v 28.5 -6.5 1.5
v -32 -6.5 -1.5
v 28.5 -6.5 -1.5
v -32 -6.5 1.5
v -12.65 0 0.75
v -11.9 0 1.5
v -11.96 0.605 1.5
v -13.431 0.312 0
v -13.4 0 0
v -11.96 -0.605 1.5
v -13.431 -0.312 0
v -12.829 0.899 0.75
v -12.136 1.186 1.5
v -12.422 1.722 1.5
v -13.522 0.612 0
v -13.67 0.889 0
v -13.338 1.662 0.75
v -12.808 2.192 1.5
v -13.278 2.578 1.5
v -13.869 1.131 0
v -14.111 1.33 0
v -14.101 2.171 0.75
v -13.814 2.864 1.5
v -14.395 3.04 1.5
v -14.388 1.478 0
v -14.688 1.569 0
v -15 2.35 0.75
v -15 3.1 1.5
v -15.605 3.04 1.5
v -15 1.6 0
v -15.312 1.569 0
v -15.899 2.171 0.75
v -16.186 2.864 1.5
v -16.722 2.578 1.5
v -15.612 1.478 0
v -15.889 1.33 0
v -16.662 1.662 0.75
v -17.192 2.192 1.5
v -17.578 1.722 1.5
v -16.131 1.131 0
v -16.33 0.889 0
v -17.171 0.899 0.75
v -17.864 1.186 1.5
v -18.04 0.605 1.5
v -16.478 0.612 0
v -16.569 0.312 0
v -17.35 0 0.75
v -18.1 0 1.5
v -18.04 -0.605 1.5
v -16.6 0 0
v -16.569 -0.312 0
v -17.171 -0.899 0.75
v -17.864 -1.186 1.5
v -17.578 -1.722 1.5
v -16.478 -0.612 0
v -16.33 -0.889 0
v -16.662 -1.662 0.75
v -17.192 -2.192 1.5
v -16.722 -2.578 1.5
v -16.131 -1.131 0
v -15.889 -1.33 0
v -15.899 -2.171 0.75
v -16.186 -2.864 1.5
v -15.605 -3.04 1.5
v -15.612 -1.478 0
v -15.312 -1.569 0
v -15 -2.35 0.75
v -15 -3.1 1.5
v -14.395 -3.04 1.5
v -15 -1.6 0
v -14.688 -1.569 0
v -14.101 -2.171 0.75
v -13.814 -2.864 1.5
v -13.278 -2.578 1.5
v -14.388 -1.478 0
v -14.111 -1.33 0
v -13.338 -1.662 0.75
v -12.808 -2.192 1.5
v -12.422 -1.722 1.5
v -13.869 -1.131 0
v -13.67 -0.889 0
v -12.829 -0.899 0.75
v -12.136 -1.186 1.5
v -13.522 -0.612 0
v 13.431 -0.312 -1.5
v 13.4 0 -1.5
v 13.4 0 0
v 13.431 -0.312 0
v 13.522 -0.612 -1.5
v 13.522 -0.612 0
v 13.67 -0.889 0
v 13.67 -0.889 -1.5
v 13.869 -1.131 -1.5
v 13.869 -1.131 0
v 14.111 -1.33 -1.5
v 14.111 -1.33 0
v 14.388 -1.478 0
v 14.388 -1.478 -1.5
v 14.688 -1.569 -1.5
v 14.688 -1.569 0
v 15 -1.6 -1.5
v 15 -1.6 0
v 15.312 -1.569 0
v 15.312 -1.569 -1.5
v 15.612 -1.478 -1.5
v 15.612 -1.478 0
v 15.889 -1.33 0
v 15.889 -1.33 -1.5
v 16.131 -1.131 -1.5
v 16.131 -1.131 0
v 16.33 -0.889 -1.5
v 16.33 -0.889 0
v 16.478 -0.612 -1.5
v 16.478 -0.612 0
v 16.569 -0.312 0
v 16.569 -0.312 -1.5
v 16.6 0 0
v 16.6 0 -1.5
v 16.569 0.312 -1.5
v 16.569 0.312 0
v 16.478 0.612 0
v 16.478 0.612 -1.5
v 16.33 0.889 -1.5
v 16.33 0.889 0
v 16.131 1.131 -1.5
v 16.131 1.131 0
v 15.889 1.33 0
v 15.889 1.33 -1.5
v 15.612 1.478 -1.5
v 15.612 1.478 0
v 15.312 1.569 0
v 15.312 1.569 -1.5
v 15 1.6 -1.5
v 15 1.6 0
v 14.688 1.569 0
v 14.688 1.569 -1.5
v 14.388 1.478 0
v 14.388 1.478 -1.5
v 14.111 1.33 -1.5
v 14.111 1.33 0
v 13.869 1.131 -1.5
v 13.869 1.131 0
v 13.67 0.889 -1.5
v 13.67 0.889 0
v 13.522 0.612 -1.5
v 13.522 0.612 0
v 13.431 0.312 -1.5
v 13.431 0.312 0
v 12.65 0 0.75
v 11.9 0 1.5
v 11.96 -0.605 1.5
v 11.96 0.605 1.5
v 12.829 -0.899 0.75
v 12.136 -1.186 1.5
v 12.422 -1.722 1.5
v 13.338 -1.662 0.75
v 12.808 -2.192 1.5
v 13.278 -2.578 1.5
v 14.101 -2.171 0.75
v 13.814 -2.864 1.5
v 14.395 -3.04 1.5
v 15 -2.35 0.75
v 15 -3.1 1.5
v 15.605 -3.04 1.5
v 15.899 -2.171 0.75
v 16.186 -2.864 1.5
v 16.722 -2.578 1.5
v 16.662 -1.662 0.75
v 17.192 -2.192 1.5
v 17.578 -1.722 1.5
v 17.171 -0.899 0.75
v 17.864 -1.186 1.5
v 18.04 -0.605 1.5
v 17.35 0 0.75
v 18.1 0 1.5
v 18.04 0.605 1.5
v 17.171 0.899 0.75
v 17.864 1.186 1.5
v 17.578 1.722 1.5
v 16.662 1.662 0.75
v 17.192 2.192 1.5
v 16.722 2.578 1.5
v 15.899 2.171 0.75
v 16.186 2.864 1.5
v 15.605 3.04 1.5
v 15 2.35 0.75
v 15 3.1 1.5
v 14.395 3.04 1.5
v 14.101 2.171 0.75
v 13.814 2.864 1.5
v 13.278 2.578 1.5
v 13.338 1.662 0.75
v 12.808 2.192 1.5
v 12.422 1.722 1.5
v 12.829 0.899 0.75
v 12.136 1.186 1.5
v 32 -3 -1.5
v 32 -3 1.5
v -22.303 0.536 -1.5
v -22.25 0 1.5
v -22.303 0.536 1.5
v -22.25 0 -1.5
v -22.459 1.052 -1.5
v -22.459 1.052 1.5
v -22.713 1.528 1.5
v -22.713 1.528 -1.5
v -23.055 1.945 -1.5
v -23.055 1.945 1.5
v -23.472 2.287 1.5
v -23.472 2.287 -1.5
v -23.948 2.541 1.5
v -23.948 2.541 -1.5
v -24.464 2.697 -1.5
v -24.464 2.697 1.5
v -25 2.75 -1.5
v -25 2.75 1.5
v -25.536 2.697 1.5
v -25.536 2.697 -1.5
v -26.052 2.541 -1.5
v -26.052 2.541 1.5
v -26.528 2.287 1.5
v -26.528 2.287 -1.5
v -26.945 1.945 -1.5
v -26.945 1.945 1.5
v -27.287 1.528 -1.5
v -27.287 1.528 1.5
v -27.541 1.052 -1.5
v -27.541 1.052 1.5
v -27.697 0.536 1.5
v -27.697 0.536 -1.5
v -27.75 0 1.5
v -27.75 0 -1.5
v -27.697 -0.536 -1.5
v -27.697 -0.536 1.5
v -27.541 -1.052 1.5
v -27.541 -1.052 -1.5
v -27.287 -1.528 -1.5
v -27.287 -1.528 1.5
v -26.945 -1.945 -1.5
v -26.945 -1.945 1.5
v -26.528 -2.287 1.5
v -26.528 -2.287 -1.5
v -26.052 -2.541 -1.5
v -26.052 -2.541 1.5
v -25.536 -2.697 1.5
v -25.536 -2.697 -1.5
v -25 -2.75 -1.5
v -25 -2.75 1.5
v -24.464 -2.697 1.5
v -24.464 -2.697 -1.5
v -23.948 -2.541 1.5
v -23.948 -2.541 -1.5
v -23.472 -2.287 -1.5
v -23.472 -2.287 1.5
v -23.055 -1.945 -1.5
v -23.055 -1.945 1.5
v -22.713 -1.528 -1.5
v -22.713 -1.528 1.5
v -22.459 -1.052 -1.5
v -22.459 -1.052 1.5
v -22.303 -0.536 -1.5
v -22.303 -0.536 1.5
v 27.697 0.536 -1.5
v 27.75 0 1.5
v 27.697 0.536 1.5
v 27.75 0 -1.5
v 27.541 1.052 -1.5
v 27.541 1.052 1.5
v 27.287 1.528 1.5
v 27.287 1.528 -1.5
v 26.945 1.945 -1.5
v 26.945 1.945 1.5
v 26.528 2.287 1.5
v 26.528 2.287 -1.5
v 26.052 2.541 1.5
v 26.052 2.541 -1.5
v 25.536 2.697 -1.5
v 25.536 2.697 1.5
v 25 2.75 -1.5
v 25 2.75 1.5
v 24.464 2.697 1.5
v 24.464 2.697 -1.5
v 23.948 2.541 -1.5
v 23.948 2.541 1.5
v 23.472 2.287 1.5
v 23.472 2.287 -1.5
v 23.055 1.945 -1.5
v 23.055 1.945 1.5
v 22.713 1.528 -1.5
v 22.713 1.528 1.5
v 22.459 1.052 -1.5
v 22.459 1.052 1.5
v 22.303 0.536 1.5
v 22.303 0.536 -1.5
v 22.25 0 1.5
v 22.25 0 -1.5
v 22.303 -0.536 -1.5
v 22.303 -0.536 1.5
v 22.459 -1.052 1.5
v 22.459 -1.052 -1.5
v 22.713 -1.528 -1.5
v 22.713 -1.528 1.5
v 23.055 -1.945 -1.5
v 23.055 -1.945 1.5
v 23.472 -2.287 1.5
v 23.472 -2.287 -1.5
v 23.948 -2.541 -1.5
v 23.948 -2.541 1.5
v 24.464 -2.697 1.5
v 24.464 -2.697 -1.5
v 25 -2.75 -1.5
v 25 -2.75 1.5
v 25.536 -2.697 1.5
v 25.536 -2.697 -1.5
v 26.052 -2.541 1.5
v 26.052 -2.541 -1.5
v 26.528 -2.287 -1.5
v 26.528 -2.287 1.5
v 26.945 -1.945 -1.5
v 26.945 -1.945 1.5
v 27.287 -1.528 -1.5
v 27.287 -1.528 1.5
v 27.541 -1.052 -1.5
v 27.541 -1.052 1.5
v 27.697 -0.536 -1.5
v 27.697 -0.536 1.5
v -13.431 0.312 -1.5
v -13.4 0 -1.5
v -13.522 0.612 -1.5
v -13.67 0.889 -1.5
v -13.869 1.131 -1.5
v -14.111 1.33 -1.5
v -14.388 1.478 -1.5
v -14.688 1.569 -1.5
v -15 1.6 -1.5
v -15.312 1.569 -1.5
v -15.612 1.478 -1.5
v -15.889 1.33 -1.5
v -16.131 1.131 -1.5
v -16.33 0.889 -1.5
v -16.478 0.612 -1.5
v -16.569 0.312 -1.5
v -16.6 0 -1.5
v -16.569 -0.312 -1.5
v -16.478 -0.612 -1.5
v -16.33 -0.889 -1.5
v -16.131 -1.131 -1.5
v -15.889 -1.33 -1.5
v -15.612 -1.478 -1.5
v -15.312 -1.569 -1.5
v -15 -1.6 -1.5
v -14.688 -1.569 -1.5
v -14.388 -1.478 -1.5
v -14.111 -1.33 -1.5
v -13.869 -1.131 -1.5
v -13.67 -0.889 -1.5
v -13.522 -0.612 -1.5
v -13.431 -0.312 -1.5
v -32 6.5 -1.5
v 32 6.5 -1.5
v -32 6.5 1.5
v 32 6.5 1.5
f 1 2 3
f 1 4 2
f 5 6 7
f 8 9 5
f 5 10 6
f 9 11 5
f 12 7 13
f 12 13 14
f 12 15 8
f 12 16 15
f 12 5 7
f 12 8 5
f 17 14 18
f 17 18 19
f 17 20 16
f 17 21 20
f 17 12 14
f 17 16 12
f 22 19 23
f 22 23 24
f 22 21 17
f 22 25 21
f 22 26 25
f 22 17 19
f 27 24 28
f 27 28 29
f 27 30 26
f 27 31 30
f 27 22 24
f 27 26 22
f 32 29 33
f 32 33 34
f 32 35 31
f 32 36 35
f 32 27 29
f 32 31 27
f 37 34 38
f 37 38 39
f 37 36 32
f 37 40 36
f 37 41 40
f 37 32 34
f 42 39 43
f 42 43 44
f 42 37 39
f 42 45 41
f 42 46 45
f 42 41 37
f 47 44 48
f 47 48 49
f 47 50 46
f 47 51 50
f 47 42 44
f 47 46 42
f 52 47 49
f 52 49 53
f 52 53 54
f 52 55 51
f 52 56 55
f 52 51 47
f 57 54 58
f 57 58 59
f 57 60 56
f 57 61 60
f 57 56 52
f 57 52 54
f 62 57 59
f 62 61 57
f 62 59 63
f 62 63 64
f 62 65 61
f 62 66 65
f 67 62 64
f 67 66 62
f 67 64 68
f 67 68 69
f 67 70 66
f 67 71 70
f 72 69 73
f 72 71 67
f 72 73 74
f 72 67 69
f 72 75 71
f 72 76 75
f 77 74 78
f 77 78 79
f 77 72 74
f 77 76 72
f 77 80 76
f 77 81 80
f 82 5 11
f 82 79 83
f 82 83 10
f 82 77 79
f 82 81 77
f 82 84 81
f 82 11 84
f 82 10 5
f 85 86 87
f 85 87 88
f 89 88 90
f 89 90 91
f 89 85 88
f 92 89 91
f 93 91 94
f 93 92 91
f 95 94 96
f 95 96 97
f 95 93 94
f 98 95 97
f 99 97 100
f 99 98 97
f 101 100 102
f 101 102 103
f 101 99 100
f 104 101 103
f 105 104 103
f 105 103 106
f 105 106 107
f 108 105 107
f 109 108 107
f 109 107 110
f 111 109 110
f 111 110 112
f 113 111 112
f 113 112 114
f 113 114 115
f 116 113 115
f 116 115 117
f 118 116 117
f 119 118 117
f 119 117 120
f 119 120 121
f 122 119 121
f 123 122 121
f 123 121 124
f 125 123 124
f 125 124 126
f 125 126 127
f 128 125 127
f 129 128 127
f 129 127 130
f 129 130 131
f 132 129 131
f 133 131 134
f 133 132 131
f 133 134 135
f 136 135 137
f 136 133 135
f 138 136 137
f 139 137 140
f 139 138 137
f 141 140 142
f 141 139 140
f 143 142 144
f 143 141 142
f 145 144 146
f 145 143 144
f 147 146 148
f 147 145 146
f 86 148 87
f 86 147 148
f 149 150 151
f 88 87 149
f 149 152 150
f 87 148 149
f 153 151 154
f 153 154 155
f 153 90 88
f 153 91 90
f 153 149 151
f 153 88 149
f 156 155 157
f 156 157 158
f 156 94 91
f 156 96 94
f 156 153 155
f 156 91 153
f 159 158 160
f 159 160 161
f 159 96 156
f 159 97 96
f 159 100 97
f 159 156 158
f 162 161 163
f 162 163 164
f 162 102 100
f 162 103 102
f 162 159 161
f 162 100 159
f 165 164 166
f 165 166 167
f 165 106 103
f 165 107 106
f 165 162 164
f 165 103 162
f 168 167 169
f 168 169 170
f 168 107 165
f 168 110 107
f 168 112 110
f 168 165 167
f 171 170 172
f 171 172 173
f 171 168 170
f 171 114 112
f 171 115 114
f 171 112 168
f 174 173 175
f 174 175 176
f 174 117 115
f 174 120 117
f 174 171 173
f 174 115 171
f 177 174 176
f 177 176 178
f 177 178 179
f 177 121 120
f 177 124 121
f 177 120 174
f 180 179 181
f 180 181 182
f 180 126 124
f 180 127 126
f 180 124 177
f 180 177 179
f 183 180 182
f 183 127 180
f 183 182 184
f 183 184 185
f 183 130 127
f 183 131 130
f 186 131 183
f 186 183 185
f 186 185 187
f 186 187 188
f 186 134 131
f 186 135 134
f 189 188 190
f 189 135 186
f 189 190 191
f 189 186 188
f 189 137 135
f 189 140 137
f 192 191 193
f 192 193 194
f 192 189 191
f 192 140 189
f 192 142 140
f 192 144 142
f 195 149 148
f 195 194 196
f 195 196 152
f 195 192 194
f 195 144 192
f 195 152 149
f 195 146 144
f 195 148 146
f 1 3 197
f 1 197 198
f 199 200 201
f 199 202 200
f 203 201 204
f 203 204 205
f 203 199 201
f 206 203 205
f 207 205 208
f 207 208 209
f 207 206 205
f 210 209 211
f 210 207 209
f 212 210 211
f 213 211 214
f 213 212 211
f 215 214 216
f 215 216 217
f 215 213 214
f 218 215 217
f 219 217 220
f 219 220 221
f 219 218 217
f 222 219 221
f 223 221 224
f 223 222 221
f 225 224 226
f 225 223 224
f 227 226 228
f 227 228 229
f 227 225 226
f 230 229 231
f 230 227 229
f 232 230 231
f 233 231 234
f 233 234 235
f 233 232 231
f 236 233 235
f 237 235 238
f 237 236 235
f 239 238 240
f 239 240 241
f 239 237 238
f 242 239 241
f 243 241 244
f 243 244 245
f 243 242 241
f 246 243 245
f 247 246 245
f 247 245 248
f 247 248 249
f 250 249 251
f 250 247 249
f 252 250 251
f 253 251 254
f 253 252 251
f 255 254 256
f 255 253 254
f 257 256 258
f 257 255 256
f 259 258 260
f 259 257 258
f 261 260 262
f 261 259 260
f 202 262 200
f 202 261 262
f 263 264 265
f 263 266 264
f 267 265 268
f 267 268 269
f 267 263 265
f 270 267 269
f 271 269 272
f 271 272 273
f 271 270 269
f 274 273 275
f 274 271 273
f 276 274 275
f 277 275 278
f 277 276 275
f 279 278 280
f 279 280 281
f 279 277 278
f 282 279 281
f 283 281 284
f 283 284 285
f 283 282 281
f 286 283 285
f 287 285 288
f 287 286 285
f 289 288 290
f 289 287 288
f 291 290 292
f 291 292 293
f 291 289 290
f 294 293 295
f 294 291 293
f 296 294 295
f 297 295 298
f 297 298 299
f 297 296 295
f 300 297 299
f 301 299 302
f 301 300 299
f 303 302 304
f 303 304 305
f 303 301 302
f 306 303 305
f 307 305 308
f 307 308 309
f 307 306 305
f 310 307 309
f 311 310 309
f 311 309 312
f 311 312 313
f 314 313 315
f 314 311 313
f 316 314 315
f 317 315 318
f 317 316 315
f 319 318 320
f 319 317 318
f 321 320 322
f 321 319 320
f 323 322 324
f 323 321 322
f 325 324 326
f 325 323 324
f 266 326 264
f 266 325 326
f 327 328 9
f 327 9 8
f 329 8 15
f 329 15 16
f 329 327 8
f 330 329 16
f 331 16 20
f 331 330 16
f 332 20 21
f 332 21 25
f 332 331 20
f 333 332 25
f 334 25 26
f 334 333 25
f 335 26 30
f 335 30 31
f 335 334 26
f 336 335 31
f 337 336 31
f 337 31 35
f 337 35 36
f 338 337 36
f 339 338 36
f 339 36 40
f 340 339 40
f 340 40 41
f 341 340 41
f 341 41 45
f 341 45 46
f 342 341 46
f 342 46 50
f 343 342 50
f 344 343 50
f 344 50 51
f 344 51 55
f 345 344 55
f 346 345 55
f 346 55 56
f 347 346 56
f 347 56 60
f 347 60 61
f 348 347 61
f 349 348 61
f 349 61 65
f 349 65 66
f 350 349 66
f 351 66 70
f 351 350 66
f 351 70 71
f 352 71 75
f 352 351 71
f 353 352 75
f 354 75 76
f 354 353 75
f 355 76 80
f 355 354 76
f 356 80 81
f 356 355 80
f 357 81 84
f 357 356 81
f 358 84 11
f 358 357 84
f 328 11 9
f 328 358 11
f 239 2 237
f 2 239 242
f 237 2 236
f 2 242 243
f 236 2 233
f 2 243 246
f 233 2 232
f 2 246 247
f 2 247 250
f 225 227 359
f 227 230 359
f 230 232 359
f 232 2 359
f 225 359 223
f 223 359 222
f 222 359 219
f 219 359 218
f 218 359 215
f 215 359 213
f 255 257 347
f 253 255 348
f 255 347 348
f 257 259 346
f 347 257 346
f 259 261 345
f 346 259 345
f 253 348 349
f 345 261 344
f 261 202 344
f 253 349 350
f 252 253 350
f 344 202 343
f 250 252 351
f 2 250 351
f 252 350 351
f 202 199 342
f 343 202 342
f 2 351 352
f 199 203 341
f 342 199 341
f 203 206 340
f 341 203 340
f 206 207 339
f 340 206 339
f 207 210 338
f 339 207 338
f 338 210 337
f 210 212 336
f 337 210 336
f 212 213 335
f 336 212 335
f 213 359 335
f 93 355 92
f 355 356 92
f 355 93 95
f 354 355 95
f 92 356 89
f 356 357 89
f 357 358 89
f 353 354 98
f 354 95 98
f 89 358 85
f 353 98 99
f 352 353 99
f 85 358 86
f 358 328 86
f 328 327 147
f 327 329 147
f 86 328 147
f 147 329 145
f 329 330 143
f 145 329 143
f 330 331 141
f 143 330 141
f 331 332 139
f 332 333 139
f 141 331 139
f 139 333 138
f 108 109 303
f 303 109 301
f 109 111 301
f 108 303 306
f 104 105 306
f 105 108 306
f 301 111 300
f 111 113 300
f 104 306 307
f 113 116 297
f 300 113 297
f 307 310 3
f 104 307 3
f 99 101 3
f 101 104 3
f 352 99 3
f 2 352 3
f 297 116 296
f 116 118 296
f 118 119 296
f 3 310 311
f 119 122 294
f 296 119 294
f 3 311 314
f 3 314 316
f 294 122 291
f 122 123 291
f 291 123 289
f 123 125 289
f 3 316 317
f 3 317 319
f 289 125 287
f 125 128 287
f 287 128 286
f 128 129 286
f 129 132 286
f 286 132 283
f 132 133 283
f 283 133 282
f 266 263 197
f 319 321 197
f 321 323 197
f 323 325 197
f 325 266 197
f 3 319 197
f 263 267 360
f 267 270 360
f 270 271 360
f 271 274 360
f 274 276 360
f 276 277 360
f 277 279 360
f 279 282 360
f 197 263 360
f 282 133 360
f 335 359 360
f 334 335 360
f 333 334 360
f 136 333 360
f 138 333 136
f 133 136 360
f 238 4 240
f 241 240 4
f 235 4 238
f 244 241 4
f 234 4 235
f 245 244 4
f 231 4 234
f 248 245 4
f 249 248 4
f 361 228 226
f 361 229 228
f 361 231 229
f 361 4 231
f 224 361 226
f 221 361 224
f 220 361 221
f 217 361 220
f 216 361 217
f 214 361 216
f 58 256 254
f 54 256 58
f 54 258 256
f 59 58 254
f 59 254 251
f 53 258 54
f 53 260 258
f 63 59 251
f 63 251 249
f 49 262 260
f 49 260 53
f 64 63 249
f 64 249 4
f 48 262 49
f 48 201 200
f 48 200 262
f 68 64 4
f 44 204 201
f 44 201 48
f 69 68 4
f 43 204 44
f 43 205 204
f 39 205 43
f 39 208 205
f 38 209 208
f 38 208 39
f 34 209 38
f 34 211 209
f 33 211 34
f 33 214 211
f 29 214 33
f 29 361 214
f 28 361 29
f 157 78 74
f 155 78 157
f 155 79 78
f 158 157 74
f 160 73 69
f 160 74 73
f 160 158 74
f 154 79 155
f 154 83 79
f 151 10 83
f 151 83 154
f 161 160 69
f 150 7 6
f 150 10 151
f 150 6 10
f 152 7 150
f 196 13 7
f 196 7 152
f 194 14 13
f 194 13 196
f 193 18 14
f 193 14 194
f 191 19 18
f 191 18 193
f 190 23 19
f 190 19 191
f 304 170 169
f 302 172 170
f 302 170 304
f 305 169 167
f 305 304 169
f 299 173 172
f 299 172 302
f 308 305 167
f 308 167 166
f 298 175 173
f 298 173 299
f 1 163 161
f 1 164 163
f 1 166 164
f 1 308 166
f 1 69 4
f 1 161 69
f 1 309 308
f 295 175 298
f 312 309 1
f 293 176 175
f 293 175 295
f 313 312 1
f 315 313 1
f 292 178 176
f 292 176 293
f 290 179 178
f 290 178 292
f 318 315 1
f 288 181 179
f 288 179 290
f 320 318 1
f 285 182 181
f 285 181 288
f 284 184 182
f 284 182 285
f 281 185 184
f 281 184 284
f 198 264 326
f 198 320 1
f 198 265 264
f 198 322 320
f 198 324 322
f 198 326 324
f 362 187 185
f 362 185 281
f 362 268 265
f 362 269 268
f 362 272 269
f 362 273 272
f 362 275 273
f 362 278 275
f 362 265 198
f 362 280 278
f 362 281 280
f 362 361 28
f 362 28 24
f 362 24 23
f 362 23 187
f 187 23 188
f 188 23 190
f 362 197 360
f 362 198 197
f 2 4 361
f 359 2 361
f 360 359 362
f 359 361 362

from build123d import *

# Parameters (mm, degrees)
SKETCH_1_W      = 64
SKETCH_1_H      = 13
SKETCH_1_R      = 2.75
SKETCH_1_R_2    = 1.6
EXTRUDE_1_DEPTH = 1.5
CHAMFER_1_SIZE  = 3.5
CHAMFER_2_SIZE  = 1.5


with BuildPart() as part:
    # 草图1 → 凸台-拉伸1 (new, symmetric)
    with BuildSketch(Plane.XY):
        Rectangle(SKETCH_1_W, SKETCH_1_H)
        with Locations((-25, 0)):
            Circle(SKETCH_1_R, mode=Mode.SUBTRACT)
        with Locations((25, 0)):
            Circle(SKETCH_1_R, mode=Mode.SUBTRACT)
        with Locations((-15, 0)):
            Circle(SKETCH_1_R_2, mode=Mode.SUBTRACT)
        with Locations(Location((15, 0, 0), (0, 0, 180))):
            Circle(SKETCH_1_R_2, mode=Mode.SUBTRACT)
    extrude(amount=EXTRUDE_1_DEPTH, both=True)

    # 倒角1
    chamfer_1_edges = [part.edges().sort_by_distance(p)[0] for p in [
        (32, -6.5, 0),
    ]]
    chamfer(chamfer_1_edges, length=CHAMFER_1_SIZE)

    # 倒角2
    chamfer_2_edges = [part.edges().sort_by_distance(p)[0] for p in [
        (-16.6, 0, 1.5),
        (16.6, 0, 1.5),
    ]]
    chamfer(chamfer_2_edges, length=CHAMFER_2_SIZE)


solid = part.part
